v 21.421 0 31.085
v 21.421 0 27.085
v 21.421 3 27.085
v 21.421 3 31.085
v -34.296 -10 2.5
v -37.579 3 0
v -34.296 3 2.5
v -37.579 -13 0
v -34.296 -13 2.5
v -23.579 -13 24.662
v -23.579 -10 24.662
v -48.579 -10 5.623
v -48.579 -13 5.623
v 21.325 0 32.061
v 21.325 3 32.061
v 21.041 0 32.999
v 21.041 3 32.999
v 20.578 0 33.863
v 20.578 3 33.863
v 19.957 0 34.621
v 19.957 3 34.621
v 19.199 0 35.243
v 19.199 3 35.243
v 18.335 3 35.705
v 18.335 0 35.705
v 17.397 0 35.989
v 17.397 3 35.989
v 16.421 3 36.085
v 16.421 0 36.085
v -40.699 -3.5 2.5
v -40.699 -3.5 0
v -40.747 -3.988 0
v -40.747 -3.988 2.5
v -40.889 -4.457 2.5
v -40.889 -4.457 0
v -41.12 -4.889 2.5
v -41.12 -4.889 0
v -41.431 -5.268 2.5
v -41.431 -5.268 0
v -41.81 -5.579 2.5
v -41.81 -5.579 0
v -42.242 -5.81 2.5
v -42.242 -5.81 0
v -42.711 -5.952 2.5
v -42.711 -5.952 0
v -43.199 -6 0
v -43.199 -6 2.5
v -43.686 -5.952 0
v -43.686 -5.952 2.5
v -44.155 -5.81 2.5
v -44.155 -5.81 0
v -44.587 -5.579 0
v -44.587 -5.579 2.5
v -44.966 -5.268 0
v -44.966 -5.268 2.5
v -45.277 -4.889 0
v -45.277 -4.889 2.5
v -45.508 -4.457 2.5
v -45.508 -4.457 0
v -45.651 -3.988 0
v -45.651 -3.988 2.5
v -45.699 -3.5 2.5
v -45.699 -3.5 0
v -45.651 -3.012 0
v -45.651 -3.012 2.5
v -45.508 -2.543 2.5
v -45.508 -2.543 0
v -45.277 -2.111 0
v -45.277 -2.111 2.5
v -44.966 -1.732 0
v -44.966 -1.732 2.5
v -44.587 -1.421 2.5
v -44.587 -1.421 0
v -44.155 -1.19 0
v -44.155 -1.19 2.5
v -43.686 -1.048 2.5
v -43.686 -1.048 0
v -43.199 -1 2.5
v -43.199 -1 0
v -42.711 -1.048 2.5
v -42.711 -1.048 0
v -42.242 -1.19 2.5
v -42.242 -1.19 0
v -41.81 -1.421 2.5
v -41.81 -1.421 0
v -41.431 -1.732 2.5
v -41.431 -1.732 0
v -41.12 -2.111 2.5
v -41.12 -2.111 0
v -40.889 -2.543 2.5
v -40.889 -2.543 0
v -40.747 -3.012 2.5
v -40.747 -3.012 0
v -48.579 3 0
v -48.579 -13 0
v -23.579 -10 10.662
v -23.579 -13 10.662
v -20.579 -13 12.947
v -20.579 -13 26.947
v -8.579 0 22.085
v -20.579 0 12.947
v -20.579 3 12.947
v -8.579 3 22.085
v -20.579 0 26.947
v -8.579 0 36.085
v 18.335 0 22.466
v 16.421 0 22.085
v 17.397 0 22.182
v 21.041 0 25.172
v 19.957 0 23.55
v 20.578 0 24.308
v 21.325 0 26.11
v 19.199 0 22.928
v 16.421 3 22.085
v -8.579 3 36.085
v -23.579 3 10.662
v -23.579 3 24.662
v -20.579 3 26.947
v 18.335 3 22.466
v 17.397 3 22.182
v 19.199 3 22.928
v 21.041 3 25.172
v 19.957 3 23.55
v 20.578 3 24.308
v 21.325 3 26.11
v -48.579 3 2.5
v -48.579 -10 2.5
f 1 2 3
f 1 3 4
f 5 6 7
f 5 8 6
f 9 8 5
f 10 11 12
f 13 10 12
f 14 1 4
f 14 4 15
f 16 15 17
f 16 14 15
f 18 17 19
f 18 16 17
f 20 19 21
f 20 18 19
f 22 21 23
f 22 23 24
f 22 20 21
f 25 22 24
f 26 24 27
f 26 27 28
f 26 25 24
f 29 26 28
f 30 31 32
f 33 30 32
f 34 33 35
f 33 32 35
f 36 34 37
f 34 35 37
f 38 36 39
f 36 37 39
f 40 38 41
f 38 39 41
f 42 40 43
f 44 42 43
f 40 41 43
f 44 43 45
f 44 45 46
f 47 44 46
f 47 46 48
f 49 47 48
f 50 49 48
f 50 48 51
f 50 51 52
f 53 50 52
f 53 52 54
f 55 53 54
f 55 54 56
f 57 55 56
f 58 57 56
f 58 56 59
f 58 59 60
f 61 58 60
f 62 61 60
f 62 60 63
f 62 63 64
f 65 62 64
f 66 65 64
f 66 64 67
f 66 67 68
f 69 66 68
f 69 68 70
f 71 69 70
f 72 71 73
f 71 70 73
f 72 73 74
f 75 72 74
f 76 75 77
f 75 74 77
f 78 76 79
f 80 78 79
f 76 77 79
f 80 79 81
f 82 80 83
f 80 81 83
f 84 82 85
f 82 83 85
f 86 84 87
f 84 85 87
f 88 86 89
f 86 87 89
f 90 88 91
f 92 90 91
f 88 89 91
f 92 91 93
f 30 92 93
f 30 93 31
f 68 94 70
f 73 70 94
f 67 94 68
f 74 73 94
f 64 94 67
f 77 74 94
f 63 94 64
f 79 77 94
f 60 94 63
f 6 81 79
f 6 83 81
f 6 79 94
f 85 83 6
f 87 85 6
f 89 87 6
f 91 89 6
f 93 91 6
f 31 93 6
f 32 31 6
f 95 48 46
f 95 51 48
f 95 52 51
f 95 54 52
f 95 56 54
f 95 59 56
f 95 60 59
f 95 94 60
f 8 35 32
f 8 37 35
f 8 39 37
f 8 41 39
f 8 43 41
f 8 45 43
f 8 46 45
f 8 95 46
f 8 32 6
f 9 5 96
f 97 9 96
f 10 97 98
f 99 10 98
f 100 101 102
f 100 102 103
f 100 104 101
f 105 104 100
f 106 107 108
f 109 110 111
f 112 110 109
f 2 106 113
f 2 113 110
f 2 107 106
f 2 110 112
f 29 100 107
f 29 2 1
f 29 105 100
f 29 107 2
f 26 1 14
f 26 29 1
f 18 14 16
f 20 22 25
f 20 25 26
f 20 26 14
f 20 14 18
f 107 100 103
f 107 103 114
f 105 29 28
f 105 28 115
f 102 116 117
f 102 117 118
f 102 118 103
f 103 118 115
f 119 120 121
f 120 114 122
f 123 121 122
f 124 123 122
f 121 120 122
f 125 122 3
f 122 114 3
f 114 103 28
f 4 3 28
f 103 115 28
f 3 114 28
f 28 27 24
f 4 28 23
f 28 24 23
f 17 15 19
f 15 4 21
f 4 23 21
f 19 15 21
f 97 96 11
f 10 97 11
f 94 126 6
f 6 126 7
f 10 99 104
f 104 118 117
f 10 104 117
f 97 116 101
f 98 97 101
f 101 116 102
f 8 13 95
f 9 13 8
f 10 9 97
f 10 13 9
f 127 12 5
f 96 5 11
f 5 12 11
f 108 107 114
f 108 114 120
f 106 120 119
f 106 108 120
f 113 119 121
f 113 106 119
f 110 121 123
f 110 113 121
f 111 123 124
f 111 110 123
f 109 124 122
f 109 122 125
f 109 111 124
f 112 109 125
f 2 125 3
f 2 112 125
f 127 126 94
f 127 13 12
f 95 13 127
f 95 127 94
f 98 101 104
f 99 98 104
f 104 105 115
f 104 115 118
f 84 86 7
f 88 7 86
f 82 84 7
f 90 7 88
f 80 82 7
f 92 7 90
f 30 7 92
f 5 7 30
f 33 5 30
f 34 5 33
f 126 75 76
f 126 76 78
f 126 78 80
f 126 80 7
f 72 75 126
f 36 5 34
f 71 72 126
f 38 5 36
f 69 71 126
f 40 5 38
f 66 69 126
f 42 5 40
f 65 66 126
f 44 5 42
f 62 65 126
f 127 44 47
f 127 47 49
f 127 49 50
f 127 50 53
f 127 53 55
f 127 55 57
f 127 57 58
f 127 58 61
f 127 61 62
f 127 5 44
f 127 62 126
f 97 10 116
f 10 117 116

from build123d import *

# Parameters (mm, degrees)
F1_DEPTH = 3
F2_DEPTH = 13
F3_DEPTH = 13
F4_START = 10
F4_DEPTH = 3
F5_DEPTH = 3
F6_R     = 2.5
F7_DEPTH = 25


with BuildPart() as f1:
    # F0 (on Front) → F1 (new body)
    with BuildSketch(Plane.XZ):
        with BuildLine():
            Line((16.4211452901, 36.0854895675), (-8.5788547099, 36.0854895675))
            Line((-8.5788547099, 36.0854895675), (-20.5788547099, 26.9466662982))
            Line((-20.5788547099, 26.9466662982), (-20.5788547099, 12.9466662982))
            Line((-20.5788547099, 12.9466662982), (-8.5788547099, 22.0854895675))
            Line((-8.5788547099, 22.0854895675), (16.4211452901, 22.0854895675))
            ThreePointArc((16.4211452901, 22.0854895675), (19.9566791961, 23.5499556615), (21.4211452901, 27.0854895675))
            Line((21.4211452901, 27.0854895675), (21.4211452901, 31.0854895675))
            ThreePointArc((21.4211452901, 31.0854895675), (19.9566791961, 34.6210234734), (16.4211452901, 36.0854895675))
        make_face()
        Polygon((-20.5788547099, 12.9466662982), (-20.5788547099, 26.9466662982), (-23.5788547099, 24.6619604809), (-23.5788547099, 10.6619604809), align=None)
    extrude(amount=-F1_DEPTH)

    # F0 (on Front) → F2 (join)
    with BuildSketch(Plane.XZ):
        Polygon((-20.5788547099, 12.9466662982), (-20.5788547099, 26.9466662982), (-23.5788547099, 24.6619604809), (-23.5788547099, 10.6619604809), align=None)
    extrude(amount=F2_DEPTH)


with BuildPart() as f3:
    # F0 (on Front) → F3 (new body)
    with BuildSketch(Plane.XZ):
        Polygon((-34.2961563672, 2.5), (-48.5788547099, 2.5), (-48.5788547099, 0), (-37.5788547099, 0), align=None)
    extrude(amount=F3_DEPTH)

    # F0 (on Front) → F4 (join)
    with BuildSketch(Plane.XZ.offset(F4_START)):
        Polygon((-23.5788547099, 10.6619604809), (-23.5788547099, 24.6619604809), (-48.5788547099, 5.6227453365), (-48.5788547099, 2.5), (-34.2961563672, 2.5), align=None)
    extrude(amount=F4_DEPTH)

    # F0 (on Front) → F5 (join)
    with BuildSketch(Plane.XZ):
        Polygon((-34.2961563672, 2.5), (-48.5788547099, 2.5), (-48.5788547099, 0), (-37.5788547099, 0), align=None)
    extrude(amount=-F5_DEPTH)

    # F6 (on face) → F7 (cut)
    with BuildSketch(Plane(origin=(0, 0, 0), x_dir=(1, 0, 0), z_dir=(0, 0, -1))):
        with Locations((-43.1985519826, 3.5)):
            Circle(F6_R)
    extrude(amount=-F7_DEPTH, mode=Mode.SUBTRACT)


solid = Compound([f1.part, f3.part])
